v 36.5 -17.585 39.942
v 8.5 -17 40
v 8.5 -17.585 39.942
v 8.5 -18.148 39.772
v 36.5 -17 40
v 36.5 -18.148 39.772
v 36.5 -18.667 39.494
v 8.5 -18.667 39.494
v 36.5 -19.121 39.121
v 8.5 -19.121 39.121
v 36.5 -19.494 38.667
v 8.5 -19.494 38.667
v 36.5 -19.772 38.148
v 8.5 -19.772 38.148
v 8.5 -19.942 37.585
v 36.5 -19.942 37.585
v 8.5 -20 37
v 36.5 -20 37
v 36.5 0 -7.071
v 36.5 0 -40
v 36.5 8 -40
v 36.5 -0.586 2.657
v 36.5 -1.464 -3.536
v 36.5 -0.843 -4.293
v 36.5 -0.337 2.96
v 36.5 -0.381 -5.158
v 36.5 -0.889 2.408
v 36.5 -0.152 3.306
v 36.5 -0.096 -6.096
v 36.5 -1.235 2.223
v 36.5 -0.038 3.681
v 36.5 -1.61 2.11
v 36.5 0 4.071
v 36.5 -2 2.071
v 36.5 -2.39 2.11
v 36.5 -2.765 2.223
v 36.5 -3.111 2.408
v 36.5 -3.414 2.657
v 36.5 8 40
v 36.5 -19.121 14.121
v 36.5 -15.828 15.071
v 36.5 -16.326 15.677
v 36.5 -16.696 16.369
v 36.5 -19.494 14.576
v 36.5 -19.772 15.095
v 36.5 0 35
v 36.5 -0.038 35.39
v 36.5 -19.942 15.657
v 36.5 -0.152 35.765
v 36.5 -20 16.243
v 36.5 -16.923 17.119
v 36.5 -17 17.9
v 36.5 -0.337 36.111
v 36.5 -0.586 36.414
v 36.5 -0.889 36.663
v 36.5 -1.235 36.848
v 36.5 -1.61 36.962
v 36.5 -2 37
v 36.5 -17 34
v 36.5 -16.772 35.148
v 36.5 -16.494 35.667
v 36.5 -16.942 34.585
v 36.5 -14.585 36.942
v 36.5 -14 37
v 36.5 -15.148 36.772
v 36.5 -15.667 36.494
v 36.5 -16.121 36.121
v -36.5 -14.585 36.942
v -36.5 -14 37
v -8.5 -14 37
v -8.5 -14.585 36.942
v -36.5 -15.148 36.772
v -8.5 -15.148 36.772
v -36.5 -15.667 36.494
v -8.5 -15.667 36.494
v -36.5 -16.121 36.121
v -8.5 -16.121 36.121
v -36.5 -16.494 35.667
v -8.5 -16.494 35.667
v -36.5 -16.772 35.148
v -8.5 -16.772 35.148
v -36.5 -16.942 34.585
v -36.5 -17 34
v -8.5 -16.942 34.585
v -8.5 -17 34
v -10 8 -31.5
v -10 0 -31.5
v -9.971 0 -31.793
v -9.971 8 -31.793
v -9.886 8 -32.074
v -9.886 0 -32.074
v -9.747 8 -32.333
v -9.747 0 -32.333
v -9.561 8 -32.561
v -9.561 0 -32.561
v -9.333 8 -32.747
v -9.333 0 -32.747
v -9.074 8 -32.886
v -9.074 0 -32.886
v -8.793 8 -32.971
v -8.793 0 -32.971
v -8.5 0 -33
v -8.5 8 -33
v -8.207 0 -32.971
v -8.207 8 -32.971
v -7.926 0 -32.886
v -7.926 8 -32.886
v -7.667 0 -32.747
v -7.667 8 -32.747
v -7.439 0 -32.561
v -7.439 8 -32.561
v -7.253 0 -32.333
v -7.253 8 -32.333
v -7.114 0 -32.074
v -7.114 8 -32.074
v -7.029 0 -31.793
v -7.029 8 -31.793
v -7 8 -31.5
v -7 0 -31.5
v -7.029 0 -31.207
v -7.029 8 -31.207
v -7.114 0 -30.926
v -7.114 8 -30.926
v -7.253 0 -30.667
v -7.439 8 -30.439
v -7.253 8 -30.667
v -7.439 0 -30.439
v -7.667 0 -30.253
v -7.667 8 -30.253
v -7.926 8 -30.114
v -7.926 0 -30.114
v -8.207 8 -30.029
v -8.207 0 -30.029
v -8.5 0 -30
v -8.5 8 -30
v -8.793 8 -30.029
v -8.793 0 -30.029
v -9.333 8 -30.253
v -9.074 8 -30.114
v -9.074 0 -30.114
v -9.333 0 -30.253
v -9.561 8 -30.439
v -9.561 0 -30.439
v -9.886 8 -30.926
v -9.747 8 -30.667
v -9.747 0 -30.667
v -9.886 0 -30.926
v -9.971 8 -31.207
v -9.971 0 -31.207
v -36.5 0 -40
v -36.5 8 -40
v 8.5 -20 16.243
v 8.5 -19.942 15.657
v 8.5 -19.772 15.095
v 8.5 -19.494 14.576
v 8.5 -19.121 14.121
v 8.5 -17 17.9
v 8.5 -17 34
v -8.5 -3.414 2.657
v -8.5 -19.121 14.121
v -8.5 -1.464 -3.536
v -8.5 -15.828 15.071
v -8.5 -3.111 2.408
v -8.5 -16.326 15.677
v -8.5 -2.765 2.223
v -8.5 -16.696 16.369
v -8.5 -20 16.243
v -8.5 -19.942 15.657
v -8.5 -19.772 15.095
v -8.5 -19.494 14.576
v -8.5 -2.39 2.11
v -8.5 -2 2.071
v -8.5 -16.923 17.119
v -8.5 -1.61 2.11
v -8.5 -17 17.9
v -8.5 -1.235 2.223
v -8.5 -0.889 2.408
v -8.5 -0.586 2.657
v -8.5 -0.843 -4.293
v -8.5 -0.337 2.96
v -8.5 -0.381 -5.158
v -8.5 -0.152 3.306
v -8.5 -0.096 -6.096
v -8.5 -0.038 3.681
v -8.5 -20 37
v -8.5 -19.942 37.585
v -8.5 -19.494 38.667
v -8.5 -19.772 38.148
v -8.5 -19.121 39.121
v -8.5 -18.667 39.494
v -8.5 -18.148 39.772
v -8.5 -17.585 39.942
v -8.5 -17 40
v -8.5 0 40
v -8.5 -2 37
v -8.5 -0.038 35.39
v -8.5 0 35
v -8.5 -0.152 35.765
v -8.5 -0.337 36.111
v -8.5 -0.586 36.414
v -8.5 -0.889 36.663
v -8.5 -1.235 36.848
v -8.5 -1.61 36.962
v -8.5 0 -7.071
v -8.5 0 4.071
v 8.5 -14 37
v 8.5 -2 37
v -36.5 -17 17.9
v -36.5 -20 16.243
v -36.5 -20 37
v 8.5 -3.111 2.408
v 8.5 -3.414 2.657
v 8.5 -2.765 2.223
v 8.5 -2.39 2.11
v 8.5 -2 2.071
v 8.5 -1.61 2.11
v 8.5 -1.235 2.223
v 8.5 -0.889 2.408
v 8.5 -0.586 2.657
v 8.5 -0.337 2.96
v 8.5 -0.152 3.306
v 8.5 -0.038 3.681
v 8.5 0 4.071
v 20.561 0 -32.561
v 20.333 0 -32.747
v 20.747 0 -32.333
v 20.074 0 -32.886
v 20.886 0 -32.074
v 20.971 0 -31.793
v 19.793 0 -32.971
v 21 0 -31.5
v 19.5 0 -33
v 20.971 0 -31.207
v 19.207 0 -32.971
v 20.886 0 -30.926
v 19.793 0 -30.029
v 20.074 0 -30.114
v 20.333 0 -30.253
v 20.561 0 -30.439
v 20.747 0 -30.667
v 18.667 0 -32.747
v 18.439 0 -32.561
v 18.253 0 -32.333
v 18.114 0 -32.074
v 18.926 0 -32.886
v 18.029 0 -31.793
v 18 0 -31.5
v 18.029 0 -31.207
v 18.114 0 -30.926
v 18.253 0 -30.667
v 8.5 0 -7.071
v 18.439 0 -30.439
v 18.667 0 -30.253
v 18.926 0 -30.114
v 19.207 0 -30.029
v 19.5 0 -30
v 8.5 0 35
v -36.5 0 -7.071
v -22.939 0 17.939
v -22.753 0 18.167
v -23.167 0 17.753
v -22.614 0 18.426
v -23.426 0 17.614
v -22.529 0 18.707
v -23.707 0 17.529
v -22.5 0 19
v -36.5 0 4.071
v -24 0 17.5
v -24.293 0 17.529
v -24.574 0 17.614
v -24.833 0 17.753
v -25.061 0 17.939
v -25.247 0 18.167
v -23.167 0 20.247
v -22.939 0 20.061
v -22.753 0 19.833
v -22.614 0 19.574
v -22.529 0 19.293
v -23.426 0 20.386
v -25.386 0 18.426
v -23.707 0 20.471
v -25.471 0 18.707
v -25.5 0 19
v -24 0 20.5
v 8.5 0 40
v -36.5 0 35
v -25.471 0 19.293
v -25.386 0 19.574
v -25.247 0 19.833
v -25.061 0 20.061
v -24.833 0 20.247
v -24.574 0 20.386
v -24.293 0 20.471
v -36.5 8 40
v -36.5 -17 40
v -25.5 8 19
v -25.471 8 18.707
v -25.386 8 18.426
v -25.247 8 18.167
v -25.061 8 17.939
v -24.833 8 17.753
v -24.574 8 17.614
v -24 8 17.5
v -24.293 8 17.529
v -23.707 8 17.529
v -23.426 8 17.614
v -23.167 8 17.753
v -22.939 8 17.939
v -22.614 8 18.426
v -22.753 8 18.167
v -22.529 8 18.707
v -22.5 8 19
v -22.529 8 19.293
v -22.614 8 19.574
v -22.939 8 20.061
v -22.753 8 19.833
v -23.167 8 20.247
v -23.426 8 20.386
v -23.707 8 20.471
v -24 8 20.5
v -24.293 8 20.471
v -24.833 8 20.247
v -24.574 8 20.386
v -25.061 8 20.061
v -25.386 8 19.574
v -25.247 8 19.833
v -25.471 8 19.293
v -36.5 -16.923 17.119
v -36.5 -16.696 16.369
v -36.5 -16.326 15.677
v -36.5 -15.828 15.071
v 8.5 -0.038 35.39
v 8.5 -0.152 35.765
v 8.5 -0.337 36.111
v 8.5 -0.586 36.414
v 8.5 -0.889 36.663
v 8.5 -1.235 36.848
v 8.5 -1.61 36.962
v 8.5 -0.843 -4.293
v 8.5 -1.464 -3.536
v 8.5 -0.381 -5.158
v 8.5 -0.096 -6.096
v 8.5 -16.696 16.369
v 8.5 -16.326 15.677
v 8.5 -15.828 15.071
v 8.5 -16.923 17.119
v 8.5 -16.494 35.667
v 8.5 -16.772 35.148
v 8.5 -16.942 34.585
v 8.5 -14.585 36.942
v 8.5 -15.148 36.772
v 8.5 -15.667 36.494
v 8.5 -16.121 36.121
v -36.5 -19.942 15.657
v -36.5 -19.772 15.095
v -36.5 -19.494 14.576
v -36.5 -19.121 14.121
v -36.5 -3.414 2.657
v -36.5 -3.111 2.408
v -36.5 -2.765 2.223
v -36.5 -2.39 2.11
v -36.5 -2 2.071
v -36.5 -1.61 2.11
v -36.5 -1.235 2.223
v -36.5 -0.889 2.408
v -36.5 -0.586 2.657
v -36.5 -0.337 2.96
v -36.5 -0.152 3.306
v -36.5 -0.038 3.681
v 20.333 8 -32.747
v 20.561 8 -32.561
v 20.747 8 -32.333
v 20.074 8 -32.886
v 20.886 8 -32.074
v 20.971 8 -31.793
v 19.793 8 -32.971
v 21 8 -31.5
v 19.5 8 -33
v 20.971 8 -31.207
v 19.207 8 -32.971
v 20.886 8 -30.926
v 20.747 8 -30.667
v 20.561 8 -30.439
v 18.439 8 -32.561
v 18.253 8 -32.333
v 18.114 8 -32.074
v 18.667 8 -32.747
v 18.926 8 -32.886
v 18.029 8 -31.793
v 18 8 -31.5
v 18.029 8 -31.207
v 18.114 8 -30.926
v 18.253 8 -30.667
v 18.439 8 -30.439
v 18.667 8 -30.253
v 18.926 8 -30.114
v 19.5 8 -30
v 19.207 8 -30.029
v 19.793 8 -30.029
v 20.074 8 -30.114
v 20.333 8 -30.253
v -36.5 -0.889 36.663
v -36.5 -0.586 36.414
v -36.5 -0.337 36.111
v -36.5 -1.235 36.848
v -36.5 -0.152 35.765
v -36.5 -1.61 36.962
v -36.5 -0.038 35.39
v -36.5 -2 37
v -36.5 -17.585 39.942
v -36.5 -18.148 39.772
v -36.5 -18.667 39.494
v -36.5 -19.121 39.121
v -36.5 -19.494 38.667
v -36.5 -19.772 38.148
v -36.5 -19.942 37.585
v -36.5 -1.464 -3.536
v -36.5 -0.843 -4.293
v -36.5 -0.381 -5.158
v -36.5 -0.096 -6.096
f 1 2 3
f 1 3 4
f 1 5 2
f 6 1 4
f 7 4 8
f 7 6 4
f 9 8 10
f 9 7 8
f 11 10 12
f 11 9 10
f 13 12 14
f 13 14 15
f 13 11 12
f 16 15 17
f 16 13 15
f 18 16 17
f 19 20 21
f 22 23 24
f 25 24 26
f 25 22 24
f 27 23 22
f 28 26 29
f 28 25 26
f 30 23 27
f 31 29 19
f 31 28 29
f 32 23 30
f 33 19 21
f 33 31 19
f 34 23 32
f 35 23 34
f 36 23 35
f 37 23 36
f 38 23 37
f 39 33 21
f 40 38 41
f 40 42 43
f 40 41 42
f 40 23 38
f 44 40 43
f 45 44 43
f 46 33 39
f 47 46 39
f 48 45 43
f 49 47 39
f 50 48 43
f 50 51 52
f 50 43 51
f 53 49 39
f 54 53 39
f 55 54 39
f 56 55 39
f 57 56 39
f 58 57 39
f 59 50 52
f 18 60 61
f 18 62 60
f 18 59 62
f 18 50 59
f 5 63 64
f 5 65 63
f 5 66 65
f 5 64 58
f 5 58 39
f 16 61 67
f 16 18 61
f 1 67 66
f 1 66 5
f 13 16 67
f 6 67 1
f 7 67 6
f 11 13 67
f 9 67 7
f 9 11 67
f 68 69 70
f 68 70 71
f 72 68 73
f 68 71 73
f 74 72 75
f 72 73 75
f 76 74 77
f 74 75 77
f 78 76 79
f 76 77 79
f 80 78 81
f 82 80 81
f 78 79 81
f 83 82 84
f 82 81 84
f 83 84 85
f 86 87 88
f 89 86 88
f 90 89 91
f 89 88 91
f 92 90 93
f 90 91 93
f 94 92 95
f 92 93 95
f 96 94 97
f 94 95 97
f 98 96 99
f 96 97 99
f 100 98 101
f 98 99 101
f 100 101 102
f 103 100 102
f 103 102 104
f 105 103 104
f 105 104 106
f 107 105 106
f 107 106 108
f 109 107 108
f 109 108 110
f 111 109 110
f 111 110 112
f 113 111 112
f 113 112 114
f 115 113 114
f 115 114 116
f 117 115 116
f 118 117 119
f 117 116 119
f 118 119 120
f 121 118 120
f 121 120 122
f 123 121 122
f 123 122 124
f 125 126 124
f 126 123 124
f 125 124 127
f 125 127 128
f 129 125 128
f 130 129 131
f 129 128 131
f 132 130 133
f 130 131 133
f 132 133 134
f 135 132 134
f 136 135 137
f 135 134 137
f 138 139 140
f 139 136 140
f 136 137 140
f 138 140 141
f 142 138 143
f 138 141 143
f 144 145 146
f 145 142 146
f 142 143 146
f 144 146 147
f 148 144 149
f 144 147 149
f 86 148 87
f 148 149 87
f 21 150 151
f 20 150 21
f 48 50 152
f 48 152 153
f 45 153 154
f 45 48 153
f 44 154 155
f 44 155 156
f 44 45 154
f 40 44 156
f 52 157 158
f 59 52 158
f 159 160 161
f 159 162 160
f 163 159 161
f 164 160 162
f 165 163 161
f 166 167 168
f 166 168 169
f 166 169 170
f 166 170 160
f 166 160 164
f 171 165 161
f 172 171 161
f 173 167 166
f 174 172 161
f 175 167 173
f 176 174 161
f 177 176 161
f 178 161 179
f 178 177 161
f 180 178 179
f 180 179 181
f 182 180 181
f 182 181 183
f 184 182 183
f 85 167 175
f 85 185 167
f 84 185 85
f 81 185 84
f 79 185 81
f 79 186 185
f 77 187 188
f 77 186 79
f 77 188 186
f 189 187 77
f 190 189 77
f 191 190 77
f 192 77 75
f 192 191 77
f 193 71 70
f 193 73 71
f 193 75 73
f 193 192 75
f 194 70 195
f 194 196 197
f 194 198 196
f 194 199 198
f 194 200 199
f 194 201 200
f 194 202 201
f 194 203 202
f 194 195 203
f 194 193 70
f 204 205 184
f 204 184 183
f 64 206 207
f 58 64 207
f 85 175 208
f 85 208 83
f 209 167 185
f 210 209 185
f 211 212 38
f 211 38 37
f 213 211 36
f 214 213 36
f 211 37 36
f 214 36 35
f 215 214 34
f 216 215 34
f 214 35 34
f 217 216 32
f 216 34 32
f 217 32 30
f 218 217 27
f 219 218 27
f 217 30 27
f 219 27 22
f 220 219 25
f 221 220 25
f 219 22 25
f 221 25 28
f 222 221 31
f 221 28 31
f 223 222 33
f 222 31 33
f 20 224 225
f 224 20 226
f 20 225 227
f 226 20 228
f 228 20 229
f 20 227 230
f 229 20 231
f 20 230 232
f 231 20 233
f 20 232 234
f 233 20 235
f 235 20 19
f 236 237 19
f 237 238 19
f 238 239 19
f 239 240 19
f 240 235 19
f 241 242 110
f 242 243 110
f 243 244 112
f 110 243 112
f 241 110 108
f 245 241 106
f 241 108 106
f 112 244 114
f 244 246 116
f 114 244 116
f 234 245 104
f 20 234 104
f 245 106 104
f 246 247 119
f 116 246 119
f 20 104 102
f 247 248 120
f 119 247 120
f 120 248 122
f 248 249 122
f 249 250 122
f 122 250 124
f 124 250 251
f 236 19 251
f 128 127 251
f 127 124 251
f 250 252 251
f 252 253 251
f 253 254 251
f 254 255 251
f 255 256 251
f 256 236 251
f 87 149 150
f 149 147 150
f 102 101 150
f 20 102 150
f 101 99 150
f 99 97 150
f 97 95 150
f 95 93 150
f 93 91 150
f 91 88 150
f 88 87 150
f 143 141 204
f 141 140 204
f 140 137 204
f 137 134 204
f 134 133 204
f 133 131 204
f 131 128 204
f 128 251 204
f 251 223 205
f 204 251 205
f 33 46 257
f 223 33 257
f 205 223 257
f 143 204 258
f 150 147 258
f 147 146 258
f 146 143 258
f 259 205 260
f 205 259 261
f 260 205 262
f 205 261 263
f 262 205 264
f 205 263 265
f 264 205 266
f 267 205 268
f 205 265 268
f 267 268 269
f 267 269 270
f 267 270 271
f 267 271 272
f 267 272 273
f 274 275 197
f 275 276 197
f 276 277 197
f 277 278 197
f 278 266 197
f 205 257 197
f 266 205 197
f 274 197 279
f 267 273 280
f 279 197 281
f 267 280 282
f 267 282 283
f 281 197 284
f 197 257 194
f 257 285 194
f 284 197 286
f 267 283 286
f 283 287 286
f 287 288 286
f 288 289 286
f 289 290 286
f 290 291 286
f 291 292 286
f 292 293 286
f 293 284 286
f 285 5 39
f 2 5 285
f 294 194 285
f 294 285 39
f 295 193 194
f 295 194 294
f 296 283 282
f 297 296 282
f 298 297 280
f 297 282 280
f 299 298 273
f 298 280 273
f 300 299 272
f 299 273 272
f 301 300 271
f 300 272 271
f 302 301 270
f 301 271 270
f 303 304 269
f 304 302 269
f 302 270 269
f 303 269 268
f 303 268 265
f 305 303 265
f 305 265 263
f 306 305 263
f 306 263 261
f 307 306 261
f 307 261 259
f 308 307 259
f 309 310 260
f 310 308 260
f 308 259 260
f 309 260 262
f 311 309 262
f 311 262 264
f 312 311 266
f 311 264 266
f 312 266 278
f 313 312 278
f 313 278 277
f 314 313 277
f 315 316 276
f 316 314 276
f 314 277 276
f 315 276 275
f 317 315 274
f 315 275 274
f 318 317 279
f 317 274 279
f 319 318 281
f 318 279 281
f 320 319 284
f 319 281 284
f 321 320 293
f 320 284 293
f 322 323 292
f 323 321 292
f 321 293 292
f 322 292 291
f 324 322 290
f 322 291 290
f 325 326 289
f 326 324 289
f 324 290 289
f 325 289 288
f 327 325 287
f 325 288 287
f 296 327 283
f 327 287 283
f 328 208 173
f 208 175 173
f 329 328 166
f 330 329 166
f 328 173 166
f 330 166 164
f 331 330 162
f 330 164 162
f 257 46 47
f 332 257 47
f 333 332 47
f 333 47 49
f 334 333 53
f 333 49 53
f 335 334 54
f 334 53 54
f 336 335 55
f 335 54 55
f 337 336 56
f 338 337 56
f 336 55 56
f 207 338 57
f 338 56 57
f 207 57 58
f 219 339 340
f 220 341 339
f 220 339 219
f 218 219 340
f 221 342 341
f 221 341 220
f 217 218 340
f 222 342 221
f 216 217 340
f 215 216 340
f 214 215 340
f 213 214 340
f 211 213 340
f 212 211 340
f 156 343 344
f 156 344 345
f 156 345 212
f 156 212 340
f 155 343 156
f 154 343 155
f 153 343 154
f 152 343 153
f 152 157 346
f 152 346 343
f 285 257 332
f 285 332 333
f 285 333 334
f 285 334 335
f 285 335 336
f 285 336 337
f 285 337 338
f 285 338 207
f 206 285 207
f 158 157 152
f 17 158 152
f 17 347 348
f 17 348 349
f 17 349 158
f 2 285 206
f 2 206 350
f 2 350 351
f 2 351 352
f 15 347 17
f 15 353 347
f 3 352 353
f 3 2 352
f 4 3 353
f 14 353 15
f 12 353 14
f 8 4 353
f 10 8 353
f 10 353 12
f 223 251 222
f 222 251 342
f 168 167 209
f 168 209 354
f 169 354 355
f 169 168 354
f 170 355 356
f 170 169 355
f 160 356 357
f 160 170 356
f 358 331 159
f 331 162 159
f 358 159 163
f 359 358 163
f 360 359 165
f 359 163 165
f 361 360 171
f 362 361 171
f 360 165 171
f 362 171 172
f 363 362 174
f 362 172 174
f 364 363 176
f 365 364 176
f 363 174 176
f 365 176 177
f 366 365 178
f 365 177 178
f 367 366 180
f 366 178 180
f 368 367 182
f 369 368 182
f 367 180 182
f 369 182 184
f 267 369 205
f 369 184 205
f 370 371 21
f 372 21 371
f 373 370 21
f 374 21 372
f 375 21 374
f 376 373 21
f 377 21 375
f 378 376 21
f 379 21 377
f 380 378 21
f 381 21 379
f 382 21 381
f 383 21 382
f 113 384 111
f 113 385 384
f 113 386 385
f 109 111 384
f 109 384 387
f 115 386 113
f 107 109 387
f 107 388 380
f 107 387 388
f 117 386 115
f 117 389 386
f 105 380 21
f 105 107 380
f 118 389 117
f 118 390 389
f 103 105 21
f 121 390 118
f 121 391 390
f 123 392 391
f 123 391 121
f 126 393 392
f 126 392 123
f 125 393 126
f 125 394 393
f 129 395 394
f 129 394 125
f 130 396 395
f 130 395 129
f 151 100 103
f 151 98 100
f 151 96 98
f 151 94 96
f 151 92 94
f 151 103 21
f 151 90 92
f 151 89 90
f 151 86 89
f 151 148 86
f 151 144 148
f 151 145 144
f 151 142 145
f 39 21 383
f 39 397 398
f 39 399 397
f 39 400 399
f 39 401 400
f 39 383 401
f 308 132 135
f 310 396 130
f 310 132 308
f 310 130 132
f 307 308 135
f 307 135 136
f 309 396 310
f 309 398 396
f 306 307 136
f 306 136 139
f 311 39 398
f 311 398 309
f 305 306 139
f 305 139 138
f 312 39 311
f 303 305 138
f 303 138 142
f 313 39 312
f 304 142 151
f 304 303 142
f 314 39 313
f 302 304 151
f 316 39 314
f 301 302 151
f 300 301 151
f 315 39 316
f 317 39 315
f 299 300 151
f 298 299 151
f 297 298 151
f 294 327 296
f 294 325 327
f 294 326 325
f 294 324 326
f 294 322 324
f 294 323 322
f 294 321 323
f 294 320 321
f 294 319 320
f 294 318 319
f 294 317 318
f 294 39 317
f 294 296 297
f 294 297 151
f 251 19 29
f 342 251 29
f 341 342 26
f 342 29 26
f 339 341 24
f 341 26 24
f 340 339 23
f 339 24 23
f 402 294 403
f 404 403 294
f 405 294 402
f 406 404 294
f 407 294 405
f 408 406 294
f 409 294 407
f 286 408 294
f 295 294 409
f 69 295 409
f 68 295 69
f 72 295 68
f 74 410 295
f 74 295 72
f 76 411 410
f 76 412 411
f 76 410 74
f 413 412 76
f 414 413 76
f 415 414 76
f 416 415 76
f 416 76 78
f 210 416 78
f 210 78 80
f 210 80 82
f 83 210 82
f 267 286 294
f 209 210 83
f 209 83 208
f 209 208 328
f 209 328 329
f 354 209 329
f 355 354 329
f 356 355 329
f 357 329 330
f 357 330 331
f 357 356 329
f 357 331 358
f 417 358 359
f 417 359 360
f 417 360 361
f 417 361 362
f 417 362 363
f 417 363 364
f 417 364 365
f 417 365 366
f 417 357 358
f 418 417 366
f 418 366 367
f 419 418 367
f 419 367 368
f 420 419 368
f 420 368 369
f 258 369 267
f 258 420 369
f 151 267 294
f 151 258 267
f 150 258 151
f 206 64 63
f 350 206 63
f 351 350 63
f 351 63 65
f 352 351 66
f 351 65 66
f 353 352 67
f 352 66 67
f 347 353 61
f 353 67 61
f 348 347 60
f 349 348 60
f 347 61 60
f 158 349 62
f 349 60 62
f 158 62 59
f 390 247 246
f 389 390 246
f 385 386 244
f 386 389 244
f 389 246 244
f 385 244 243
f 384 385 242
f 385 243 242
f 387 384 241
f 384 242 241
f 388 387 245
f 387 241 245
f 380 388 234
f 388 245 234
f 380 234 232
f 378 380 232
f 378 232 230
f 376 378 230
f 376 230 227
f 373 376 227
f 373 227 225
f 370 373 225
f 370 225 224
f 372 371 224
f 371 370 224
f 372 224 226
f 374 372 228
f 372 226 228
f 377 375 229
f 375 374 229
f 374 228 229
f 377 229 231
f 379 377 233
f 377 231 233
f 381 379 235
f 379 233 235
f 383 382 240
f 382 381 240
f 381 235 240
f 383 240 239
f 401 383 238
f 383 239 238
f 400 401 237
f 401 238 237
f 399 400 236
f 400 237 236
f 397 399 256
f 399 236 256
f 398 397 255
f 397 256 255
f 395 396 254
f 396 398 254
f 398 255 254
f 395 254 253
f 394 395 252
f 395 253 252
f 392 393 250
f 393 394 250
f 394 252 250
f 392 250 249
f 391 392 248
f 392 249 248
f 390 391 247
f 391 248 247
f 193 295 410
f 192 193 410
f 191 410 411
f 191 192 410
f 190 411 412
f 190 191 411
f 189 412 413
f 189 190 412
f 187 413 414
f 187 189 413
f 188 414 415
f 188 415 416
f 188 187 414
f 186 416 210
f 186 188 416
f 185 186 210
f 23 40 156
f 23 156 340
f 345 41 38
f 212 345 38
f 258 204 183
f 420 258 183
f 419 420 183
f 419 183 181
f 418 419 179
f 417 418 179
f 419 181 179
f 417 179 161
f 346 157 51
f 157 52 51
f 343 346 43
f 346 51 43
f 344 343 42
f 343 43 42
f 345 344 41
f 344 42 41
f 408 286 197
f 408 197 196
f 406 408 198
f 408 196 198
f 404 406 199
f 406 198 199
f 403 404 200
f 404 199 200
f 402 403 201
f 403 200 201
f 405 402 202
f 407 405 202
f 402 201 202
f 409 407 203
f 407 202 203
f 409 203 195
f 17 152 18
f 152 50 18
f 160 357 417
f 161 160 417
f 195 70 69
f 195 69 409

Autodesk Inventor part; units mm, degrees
ref_plane "YZ Plane" through (0, 0, 0) normal (1, 0, 0) x (0, 1, 0)
ref_plane "XZ Plane" through (0, 0, 0) normal (0, 1, 0) x (-1, 0, 0)
ref_plane "XY Plane" through (0, 0, 0) normal (0, 0, 1) x (1, 0, 0)
sketch "Sketch1" plane through (0, 0, 0) normal (0, 1, 0) x (-1, 0, 0)
  line L0 (-36.5, 40) -> (36.5, 40)
  line L1 (36.5, 40) -> (36.5, -40)
  line L2 (36.5, -40) -> (-36.5, -40)
  line L3 (-36.5, -40) -> (-36.5, 40)
  line L4 (-36.5, 40) -> (36.5, -40) construction
  line L5 (36.5, 40) -> (-36.5, -40) construction
  line L6 (36.5, 40) -> (36.5, 13)
  line L7 (-36.5, -40) -> (-9.5, -40)
  line L8 (-36.5, -40) -> (18.5, -40)
  circle A0 centre (8.5, -31.5) radius 1.5
  circle A1 centre (-19.5, -31.5) radius 1.5
  circle A2 centre (-19.5, -31.5) radius 1.5
  circle A3 centre (24, 19) radius 1.5
  line L9 (0, 0) -> (0, 17.5)
  line L10 (0, 17.5) -> (0, 19)
  line L11 (0, 19) -> (24, 19)
  line L12 (0, 0) -> (0, -31.5)
  line L13 (0, -31.5) -> (8.5, -31.5)
  line L14 (0, -31.5) -> (-19.5, -31.5)
  dimension "d0" = 73
  dimension "d1" = 80
  dimension "d5" = 3
  dimension "d6" = 3
  dimension "d7" = 3
  dimension "d10" = 17.5
  dimension "d11" = 8.5
  dimension "d12" = 19.5
  dimension "d13" = 31.5
  dimension "d14" = 24
extrude "Extrusion1" add sketch "Sketch1" along normal blind 8
sketch "Sketch2" plane through (36.5, 0, 40) normal (1, 0, 0) x (0, 0, -1)
  line L0 (75, 0) -> (55, 0)
  line L1 (80, 0) -> (0, 0) projected
  line L2 (55, 0) -> (35, 0)
  line L3 (0, 0) -> (32.9289, 0)
  line L4 (44.0711, 0) -> (32.9289, 0)
  line L5 (75, 0) -> (80, 0)
  line L6 (5, 0) -> (25, 0)
  line L7 (23.7574, -20) -> (3, -20)
  line L8 (0, -17) -> (0, 0)
  line L9 (0, 0) -> (80, 0)
  line L10 (22.1005, -17) -> (6, -17)
  line L11 (3, -14) -> (3, -2)
  line L12 (3, -2.5) -> (3, -2)
  line L13 (25, 0) -> (45, 0)
  line L14 (25.8787, -19.1213) -> (43.5355, -1.4645)
  line L15 (24.9289, -15.8284) -> (37.3431, -3.4142)
  arc A0 (22.1005, -17) -> (24.9289, -15.8284) centre (22.1005, -13) ccw
  arc A1 (3, -14) -> (6, -17) centre (6, -14) ccw
  arc A2 (0, -17) -> (3, -20) centre (3, -17) ccw
  arc A3 (23.7574, -20) -> (25.8787, -19.1213) centre (23.7574, -17) ccw
  arc A4 (37.3431, -3.4142) -> (35.9289, 0) centre (35.9289, -2) ccw
  arc A5 (5, 0) -> (3, -2) centre (5, -2) ccw
  line L16 (80, 0) -> (47.0711, 0)
  arc A6 (47.0711, 0) -> (43.5355, -1.4645) centre (47.0711, -5) ccw
  line L17 (35.9289, 0) -> (47.0711, 0)
  line L18 (5, 0) -> (0, 0)
  point P0 (40, 0)
  point P1 (39.2426, 0)
  point P2 (25, -20)
  point P3 (0, -20)
  point P4 (40.7574, 0)
extrude "Extrusion3" add sketch "Sketch2" against normal up to surface (73 mm away) contours A6 L14 A3 L7 A2 L8 L1 A5 L11 A1 L10 A0 L15 A4
sketch "Sketch3" plane through (-36.5, 8, 40) normal (0, 0, 1) x (1, 0, 0)
  line L0 (0, 0) -> (28, 0)
  line L1 (0, 0) -> (73, 0) projected
  line L2 (73, 0) -> (45, 0)
  line L3 (73, -28) -> (0, -28) projected
  line L4 (28, 0) -> (45, 0)
  line L5 (45, 0) -> (45, -28)
  line L6 (45, -28) -> (28, -28)
  line L7 (28, -28) -> (28, 0)
  line L8 (73, -8) -> (0, -8) projected
  line L9 (28, 0) -> (45, 0)
  line L10 (45, 0) -> (45, -8)
  line L11 (45, -8) -> (28, -8)
  line L12 (28, -8) -> (28, 0)
  point P0 (36.5, -8)
  dimension "d32" = 28
  dimension "d33" = 28
extrude "Extrusion4" cut sketch "Sketch3" against normal up to surface (80 mm away) contours L8 L5 L3 L7
properties part number "Base"
